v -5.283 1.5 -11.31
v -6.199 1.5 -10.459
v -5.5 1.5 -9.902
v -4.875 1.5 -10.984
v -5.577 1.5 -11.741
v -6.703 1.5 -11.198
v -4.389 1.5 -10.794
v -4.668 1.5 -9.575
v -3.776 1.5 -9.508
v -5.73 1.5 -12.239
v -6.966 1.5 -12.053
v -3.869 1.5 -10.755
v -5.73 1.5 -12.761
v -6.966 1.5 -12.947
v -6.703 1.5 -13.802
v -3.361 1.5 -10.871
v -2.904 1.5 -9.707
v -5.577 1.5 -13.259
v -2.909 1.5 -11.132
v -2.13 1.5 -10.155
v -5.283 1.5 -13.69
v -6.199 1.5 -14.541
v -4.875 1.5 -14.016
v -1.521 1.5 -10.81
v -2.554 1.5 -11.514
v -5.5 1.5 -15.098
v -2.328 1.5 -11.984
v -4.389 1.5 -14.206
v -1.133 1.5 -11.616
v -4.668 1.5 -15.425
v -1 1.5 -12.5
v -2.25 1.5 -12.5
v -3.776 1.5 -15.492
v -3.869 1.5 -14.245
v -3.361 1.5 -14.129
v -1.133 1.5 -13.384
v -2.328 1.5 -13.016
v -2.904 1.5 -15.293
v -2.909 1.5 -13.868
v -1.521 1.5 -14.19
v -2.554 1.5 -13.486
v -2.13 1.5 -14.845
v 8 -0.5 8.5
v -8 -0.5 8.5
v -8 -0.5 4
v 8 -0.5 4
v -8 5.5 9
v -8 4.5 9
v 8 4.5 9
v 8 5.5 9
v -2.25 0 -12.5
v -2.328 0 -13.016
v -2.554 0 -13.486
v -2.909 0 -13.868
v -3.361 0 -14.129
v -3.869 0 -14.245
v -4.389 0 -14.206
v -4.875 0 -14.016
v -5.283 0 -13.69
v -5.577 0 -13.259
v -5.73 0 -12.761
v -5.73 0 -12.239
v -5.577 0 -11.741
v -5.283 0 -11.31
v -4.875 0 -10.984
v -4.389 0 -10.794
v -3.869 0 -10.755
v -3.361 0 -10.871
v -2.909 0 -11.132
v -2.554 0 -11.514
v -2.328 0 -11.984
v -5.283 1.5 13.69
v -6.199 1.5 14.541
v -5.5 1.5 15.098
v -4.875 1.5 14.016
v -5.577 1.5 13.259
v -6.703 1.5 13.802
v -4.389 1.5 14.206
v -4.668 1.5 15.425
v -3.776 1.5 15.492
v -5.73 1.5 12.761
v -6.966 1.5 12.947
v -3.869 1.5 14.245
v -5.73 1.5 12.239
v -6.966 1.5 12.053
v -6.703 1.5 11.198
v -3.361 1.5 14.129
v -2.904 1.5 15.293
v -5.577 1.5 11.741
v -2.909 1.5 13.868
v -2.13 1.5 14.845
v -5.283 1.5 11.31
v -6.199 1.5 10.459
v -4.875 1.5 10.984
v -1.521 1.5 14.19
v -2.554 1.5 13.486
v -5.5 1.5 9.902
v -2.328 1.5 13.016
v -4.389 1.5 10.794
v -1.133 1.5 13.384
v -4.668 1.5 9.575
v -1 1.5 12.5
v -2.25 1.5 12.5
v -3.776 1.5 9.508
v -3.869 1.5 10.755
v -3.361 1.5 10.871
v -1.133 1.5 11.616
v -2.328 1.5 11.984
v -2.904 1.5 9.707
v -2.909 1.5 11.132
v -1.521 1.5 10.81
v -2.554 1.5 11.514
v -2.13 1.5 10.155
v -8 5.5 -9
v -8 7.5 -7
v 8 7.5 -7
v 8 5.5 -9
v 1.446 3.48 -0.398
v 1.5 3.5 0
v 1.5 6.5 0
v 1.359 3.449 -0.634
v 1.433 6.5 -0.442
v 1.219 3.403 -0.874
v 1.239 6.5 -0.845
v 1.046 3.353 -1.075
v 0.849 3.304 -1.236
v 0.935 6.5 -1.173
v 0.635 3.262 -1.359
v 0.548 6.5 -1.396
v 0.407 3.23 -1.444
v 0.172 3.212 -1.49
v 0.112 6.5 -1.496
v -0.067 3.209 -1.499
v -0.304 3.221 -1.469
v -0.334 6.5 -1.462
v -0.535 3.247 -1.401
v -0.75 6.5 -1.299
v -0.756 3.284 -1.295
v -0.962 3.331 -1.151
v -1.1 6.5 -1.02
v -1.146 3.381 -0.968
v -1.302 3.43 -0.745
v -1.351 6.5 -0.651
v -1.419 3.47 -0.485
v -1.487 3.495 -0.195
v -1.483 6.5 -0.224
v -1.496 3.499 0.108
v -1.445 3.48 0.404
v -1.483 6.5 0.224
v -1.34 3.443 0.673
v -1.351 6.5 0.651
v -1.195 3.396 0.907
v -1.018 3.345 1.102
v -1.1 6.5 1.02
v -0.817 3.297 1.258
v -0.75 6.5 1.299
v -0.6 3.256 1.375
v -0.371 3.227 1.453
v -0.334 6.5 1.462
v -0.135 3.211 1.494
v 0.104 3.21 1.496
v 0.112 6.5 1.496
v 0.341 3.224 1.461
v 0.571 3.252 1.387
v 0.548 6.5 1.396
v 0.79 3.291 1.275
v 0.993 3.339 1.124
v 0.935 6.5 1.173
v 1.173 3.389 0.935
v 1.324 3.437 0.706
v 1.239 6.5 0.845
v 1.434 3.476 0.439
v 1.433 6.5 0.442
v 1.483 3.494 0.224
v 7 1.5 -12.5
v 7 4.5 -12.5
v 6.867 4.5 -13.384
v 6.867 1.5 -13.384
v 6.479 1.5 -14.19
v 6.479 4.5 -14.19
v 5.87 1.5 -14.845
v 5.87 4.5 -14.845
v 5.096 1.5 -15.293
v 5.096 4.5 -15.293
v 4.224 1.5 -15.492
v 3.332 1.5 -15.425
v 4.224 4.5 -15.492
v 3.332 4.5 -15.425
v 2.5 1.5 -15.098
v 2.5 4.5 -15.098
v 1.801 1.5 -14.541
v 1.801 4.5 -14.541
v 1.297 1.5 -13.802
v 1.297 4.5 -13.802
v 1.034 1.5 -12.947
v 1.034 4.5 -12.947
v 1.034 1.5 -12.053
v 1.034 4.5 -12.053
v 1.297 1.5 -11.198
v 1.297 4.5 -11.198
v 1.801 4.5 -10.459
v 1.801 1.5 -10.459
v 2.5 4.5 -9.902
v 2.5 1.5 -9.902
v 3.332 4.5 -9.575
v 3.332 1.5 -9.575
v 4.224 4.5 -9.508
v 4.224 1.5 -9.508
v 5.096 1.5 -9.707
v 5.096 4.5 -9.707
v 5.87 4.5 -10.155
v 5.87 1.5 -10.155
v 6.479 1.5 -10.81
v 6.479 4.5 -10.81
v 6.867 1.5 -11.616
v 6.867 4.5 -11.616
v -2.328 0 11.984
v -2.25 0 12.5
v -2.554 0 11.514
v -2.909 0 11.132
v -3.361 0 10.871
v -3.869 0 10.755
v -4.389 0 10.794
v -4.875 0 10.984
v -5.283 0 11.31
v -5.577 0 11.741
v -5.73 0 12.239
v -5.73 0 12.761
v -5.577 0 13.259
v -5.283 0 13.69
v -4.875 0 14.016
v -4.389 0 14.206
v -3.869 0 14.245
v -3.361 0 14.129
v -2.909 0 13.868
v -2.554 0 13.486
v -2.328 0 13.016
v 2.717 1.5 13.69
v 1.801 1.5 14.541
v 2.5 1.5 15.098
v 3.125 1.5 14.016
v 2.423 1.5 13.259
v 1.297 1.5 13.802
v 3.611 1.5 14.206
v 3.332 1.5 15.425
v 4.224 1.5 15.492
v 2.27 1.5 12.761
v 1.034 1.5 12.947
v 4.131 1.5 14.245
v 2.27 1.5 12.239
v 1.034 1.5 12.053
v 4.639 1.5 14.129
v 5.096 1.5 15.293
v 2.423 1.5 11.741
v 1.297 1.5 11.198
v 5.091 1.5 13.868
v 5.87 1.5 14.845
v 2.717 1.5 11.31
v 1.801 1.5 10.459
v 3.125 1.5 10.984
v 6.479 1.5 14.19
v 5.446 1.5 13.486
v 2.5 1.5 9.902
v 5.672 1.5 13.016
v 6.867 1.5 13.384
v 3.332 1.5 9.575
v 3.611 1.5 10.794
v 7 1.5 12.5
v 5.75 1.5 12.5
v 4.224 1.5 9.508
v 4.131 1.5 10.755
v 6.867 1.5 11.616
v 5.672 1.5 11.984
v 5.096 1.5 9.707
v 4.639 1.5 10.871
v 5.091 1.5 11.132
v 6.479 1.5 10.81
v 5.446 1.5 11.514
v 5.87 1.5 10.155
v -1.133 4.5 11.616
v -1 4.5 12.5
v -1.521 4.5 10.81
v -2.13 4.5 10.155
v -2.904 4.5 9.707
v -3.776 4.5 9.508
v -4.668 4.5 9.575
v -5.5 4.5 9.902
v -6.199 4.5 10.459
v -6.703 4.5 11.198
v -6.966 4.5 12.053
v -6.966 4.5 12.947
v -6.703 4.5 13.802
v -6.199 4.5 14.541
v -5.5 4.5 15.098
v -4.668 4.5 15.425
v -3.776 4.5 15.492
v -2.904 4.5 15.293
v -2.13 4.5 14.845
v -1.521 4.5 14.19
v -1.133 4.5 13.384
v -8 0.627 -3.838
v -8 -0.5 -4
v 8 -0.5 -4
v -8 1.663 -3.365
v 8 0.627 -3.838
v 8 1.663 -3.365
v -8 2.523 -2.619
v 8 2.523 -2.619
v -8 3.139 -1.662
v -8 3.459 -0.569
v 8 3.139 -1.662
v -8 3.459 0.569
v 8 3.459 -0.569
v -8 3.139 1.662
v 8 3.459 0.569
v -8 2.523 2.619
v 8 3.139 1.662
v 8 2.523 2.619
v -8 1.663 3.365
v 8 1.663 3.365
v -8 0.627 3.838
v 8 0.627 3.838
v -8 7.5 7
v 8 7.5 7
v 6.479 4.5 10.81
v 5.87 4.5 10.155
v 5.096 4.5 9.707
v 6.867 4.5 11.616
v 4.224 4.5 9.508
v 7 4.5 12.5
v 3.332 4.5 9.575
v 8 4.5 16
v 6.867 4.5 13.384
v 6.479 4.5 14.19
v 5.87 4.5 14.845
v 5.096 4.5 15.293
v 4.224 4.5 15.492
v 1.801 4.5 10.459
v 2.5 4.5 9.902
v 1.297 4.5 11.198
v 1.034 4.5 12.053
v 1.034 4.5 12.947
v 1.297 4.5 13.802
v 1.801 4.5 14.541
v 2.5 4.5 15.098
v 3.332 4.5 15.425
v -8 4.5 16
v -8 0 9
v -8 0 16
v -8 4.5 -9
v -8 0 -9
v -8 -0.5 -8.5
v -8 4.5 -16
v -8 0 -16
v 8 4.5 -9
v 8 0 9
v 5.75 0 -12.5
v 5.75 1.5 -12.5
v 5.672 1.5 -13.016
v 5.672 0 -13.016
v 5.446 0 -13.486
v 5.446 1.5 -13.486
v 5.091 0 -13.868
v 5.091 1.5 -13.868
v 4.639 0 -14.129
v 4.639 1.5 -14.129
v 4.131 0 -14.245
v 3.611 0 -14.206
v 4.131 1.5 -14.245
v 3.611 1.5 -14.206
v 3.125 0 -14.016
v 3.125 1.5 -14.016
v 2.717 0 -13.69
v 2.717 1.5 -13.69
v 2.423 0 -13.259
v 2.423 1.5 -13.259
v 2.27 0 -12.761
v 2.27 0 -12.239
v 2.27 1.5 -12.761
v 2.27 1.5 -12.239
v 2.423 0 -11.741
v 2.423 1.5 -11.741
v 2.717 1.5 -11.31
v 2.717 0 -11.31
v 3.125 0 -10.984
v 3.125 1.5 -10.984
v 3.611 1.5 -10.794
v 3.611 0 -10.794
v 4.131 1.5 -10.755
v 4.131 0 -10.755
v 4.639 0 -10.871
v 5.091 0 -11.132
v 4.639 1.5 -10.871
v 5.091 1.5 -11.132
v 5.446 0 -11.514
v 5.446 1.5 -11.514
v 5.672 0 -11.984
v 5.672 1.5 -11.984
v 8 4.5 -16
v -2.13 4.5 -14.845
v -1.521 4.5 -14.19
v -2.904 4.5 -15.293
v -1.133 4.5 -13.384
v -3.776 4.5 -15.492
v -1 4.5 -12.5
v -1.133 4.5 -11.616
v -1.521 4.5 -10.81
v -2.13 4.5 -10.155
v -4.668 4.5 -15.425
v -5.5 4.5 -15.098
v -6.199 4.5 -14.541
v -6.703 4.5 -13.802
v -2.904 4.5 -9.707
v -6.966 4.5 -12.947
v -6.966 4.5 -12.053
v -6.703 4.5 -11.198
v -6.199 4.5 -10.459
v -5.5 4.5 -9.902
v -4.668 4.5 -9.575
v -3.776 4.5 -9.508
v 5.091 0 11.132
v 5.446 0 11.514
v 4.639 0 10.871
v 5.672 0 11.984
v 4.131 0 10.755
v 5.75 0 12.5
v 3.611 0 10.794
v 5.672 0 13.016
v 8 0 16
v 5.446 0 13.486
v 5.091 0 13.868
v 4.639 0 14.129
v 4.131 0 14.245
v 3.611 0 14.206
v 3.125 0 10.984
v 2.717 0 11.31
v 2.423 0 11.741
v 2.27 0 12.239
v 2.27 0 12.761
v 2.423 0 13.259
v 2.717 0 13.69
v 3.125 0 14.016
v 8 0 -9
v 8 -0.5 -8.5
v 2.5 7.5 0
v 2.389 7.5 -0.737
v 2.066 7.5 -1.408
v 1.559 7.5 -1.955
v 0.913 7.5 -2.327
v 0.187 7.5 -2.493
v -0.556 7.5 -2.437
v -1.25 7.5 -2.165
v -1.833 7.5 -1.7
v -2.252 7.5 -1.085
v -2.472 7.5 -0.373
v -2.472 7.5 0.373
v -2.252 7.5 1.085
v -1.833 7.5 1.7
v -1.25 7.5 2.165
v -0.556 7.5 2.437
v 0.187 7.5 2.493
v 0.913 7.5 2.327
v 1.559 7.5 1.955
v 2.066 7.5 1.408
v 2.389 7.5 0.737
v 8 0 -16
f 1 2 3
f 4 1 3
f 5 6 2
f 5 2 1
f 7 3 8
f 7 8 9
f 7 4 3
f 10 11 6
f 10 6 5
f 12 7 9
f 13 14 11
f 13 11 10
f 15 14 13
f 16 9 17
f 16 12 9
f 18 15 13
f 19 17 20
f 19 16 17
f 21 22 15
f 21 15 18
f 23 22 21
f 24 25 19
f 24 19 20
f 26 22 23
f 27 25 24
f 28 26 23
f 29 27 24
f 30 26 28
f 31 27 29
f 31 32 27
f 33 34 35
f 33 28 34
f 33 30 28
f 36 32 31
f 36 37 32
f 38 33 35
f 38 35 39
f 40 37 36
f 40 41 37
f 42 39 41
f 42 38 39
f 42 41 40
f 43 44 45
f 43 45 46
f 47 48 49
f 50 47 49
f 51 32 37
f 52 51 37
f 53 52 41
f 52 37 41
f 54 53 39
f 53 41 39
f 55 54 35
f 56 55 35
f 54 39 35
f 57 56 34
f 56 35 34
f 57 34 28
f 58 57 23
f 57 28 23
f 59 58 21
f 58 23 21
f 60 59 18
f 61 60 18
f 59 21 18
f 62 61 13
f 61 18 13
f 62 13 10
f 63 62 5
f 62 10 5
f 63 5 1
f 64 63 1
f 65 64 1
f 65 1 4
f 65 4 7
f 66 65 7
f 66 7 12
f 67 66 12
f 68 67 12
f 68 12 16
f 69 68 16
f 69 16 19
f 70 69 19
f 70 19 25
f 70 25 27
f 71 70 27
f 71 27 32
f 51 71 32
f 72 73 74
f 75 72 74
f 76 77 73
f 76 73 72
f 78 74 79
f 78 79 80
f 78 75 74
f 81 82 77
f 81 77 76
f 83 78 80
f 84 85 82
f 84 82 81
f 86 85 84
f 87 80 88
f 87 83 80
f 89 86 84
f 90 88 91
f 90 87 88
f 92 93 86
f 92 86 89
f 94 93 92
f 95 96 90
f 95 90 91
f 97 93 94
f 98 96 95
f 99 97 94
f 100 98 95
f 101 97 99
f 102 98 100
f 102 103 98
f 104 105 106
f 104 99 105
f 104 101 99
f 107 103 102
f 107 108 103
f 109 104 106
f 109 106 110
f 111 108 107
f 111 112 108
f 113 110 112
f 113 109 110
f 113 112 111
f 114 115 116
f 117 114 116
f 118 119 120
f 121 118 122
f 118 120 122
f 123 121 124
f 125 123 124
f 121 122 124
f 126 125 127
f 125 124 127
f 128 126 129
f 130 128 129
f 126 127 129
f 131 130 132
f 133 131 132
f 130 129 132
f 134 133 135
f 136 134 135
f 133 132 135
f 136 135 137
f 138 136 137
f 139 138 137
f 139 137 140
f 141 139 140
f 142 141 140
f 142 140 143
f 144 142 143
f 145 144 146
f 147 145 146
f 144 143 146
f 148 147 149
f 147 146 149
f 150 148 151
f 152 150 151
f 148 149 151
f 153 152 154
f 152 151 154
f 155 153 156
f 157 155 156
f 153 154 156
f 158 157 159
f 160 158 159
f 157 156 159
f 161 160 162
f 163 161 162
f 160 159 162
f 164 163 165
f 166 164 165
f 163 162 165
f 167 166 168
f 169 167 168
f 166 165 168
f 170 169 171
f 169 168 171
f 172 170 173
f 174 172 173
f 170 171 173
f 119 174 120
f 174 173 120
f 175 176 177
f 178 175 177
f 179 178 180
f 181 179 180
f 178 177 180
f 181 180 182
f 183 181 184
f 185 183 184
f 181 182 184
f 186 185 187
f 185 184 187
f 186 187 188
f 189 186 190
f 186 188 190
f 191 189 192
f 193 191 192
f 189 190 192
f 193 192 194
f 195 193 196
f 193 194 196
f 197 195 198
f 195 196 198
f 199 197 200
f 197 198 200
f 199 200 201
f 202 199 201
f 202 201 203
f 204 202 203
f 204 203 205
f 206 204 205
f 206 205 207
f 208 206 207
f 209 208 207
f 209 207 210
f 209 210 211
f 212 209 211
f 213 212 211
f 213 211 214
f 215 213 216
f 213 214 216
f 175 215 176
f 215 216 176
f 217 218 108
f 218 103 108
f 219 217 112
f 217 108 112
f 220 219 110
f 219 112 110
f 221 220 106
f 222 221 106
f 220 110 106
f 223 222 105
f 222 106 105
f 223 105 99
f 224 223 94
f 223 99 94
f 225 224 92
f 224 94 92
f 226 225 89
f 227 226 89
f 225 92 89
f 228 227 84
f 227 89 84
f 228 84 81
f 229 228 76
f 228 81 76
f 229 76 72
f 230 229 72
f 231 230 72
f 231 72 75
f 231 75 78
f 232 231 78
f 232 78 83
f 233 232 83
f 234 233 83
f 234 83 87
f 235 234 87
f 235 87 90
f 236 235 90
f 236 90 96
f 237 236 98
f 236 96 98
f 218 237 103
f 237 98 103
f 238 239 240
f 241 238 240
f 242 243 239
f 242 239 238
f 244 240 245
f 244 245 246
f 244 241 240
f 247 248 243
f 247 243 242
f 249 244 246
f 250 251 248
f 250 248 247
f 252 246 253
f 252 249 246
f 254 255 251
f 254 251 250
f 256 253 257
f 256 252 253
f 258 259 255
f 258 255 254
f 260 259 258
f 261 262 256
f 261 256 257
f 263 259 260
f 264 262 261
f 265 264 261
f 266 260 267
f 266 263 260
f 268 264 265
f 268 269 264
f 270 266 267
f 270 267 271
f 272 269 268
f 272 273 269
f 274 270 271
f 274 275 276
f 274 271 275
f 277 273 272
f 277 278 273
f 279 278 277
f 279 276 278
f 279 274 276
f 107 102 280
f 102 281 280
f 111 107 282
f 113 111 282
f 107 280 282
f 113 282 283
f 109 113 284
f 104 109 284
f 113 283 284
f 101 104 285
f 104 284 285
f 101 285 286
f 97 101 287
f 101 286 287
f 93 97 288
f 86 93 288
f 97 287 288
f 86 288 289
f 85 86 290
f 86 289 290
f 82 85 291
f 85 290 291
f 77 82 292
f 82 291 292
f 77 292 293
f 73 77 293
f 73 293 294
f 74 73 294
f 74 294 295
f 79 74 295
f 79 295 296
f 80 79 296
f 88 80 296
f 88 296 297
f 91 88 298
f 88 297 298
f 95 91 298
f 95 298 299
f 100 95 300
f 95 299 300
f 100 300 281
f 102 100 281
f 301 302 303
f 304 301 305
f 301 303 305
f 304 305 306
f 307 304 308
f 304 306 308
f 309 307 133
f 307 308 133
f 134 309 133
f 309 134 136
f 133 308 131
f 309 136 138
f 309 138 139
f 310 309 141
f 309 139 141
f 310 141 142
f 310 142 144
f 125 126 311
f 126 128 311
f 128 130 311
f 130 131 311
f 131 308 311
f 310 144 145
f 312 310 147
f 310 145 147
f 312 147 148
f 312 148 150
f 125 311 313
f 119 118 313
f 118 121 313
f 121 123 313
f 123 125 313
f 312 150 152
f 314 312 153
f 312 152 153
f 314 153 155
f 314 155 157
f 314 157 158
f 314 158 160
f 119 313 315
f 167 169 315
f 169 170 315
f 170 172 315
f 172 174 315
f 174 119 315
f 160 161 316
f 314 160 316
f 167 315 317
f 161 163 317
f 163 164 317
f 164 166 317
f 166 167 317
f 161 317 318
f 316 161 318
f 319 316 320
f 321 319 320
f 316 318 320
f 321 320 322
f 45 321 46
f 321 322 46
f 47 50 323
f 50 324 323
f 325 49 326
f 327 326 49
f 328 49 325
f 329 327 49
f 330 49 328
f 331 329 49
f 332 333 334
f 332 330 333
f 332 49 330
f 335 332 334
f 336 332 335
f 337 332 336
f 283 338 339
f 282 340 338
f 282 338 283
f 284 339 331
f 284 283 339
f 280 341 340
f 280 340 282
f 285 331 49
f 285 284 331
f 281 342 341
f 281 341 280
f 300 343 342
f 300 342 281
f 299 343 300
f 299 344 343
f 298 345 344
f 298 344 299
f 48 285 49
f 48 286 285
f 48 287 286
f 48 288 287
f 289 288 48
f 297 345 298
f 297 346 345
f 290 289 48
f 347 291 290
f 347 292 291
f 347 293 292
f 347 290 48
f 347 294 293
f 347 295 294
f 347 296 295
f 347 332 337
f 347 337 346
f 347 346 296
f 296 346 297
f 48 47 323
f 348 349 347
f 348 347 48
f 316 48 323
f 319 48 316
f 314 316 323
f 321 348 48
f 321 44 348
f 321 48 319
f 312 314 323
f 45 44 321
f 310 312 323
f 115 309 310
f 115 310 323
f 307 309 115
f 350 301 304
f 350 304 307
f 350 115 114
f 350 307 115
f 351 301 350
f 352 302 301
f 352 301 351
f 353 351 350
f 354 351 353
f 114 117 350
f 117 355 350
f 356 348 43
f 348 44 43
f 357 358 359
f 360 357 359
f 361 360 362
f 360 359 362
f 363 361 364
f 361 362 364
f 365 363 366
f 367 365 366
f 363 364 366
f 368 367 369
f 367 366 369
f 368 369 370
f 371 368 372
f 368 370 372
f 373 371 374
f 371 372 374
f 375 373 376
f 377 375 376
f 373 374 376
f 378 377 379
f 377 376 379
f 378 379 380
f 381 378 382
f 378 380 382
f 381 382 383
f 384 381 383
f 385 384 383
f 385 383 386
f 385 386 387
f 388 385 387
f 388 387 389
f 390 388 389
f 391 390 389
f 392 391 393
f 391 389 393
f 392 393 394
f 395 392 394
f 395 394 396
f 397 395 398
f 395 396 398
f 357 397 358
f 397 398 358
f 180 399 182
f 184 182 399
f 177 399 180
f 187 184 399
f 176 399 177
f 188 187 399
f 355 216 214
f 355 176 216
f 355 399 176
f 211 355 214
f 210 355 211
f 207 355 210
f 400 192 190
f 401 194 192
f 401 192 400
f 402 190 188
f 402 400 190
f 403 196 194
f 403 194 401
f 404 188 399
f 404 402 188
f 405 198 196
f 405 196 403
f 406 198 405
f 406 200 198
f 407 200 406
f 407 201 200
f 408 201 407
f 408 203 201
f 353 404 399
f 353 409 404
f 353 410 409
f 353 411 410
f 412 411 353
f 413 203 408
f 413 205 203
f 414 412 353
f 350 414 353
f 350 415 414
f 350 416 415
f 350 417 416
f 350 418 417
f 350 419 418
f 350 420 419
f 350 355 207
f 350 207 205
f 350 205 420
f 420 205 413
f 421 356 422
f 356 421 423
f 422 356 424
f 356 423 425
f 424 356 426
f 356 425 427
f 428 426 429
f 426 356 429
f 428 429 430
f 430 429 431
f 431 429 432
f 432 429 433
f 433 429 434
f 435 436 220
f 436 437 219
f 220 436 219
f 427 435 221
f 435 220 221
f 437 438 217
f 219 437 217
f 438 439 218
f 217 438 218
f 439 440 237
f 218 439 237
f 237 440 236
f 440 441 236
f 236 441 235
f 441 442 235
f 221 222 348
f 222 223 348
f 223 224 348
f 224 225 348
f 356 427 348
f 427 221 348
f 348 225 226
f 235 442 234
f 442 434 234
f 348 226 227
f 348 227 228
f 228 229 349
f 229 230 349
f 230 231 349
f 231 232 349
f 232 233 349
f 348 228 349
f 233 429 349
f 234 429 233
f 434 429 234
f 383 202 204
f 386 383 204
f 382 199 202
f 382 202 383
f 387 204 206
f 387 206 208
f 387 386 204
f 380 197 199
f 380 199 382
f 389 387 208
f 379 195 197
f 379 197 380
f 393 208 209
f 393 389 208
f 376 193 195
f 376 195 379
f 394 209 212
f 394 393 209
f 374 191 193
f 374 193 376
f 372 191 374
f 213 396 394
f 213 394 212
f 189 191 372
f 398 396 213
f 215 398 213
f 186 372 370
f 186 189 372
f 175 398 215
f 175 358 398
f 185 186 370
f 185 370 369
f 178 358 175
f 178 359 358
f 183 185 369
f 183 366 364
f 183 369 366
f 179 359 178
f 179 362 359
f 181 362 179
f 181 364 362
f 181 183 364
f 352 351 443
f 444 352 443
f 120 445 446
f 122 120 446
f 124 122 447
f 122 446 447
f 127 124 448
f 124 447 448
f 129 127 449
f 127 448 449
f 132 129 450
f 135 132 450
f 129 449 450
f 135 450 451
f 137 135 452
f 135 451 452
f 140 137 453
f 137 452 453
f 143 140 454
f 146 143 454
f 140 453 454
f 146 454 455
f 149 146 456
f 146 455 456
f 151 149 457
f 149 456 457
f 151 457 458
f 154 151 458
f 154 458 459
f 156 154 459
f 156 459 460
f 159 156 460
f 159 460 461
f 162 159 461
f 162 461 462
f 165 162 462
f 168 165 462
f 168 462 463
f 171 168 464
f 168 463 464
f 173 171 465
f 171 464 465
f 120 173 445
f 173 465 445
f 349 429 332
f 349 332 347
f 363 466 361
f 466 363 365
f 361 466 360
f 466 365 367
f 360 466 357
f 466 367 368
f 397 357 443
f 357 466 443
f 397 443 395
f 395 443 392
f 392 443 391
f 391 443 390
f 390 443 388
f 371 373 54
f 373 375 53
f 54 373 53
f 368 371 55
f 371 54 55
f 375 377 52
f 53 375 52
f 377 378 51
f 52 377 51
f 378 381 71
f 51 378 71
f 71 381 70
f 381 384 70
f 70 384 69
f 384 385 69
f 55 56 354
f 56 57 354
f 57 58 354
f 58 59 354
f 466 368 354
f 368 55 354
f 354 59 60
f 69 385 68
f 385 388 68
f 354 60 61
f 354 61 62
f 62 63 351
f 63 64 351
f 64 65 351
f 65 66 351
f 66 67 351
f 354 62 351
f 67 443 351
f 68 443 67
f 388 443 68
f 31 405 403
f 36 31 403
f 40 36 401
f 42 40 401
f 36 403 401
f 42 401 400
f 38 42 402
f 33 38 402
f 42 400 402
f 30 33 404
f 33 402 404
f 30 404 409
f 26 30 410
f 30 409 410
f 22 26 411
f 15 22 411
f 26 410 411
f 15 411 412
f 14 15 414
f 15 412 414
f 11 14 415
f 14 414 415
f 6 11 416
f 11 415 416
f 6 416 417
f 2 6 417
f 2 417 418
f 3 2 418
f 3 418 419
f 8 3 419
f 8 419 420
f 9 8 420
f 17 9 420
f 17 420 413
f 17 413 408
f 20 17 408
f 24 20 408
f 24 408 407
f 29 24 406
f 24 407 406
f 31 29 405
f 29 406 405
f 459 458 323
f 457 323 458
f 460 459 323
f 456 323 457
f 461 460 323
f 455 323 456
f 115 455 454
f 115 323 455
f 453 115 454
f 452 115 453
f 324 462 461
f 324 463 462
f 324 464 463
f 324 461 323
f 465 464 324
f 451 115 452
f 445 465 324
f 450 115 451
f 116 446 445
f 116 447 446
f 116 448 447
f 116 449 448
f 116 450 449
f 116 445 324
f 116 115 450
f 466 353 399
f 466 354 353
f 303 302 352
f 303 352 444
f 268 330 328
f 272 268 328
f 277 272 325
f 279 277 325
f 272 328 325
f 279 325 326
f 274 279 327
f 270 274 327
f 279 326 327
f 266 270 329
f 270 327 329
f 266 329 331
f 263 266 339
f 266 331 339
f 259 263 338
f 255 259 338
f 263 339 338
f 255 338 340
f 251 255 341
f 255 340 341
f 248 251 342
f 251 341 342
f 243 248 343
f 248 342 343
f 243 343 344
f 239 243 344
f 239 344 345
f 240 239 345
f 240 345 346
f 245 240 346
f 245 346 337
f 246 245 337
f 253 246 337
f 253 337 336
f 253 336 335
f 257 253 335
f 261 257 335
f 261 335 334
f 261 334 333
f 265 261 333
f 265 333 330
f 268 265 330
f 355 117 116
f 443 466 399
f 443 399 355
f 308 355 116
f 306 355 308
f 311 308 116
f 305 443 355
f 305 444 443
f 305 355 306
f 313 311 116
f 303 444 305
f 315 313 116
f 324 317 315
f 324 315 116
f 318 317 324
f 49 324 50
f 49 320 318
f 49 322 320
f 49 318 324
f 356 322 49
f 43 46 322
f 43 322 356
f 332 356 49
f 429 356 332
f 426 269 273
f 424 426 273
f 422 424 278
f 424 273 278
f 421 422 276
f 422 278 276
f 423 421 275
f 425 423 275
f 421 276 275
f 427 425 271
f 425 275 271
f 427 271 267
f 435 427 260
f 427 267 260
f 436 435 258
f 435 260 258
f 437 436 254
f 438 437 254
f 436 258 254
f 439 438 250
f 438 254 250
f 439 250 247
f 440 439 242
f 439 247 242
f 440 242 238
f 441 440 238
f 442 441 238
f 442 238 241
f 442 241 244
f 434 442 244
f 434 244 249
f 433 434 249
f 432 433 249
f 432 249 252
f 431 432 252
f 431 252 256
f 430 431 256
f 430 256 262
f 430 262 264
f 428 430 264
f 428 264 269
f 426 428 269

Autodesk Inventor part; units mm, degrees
ref_plane "YZ Plane" through (0, 0, 0) normal (1, 0, 0) x (0, 1, 0)
ref_plane "XZ Plane" through (0, 0, 0) normal (0, 1, 0) x (-1, 0, 0)
ref_plane "XY Plane" through (0, 0, 0) normal (0, 0, 1) x (1, 0, 0)
sketch "Sketch3" plane through (0, 0, 0) normal (0, 1, 0) x (-1, 0, 0)
  line L0 (-8, 16) -> (8, 16)
  line L1 (8, 16) -> (8, -16)
  line L2 (8, -16) -> (-8, -16)
  line L3 (-8, -16) -> (-8, 16)
  line L4 (-8, 16) -> (8, -16) construction
  line L5 (8, 16) -> (-8, -16) construction
  point P0 (0, 0)
  dimension "d7" = 16
  dimension "d8" = 32
extrude "Extrusion1" add sketch "Sketch3" along normal blind 4.5
sketch "Sketch4" plane through (0, 0, 0) normal (0, -1, 0) x (1, 0, 0)
  line L0 (0, 0) -> (0, 9)
  line L1 (0, 9) -> (0, -9)
  line L2 (8, 16) -> (8, -16) projected
  line L3 (-8, -9) -> (8, -9)
  line L4 (8, -9) -> (8, 9)
  line L5 (8, 9) -> (-8, 9)
  line L6 (-8, 9) -> (-8, -9)
  line L7 (-8, -9) -> (8, 9) construction
  line L8 (8, -9) -> (-8, 9) construction
  dimension "d11" = 9
  dimension "d12" = 18
  dimension "d13" = 41.633
extrude "Extrusion2" add sketch "Sketch4" along normal blind 0.5
chamfer "Chamfer1" distance 0.5 angle 45 1 edges at (0, -0.5, 9)
chamfer "Chamfer2" distance 0.5 angle 45 1 edges at (0, -0.5, -9)
sketch "Sketch5" plane through (0, 4.5, 0) normal (0, 1, 0) x (1, 0, 0)
  line L0 (8, -16) -> (8, 16) projected
  line L1 (-8, -9) -> (8, -9)
  line L2 (8, -9) -> (8, 9)
  line L3 (8, 9) -> (-8, 9)
  line L4 (-8, 9) -> (-8, -9)
  line L5 (-8, -9) -> (8, 9) construction
  line L6 (8, -9) -> (-8, 9) construction
  point P0 (0, 0)
  dimension "d22" = 18
extrude "Extrusion3" add sketch "Sketch5" along normal blind 3
chamfer "Chamfer3" distance 2 angle 45 2 edges at (0, 7.5, 9) (0, 7.5, -9)
sketch "Sketch6" plane through (0, 4.5, 0) normal (0, 1, 0) x (1, 0, 0)
  line L0 (-8, -9) -> (-8, -16) construction
  line L1 (-8, -12.5) -> (8, -12.5) construction
  line L2 (8, -9) -> (8, -16) construction
  circle A0 centre (4, -12.5) radius 3 construction
  line L3 (8, -16) -> (-8, -16) construction
  line L4 (0, -16) -> (0, 17.9963) construction
  circle A1 centre (-4, -12.5) radius 3 construction
  line L5 (-8, -8.5) -> (-8, 8.5) construction
  line L6 (-8, 0) -> (8, 0) construction
  line L7 (8, 8.5) -> (8, -8.5) construction
  circle A2 centre (4, 12.5) radius 3 construction
  circle A3 centre (-4, 12.5) radius 3 construction
  circle A4 centre (4, -12.5) radius 3
  circle A5 centre (-4, -12.5) radius 3 construction
  circle A6 centre (-4, -12.5) radius 3
  circle A7 centre (4, 12.5) radius 3 construction
  circle A8 centre (-4, 12.5) radius 3 construction
  circle A9 centre (4, 12.5) radius 3
  circle A10 centre (-4, 12.5) radius 3 construction
  circle A11 centre (-4, 12.5) radius 3
  point P0 (0, 0)
  dimension "d28" = 6
  dimension "d29" = 4
  dimension "d30" = 33.9963
extrude "Extrusion4" cut sketch "Sketch6" against normal blind 3
sketch "Sketch7" plane through (0, 4.5, 0) normal (0, 1, 0) x (1, 0, 0)
  circle A0 centre (-4, -12.5) radius 3 construction
  line L0 (-7, -12.5) -> (-4, -12.5) construction
  circle A1 centre (4, -12.5) radius 3 construction
  line L1 (-4, -12.5) -> (4, -12.5) construction
  circle A2 centre (4, 12.5) radius 3 construction
  line L2 (4, -12.5) -> (4, 12.5) construction
  circle A3 centre (-4, 12.5) radius 3 construction
  line L3 (4, 12.5) -> (-4, 12.5) construction
  circle A4 centre (-4, -12.5) radius 1.75
  circle A5 centre (4, -12.5) radius 1.75
  circle A6 centre (4, 12.5) radius 1.75
  circle A7 centre (-4, 12.5) radius 1.75
  point P0 (0, 0)
  dimension "d33" = 3.5
  dimension "d34" = 3.5
  dimension "d35" = 3.5
  dimension "d36" = 3.5
extrude "Extrusion5" cut sketch "Sketch7" against normal blind 5
sketch "Sketch8" plane through (0, 7.5, 0) normal (0, 1, 0) x (1, 0, 0)
  circle A0 centre (0, 0) radius 1.5
  dimension "d39" = 3
extrude "Extrusion6" cut sketch "Sketch8" against normal blind 99
chamfer "Chamfer4" distance 1 angle 45 1 edges at (-1.5, 7.5, 0)
sketch "Sketch9" plane through (8, 0, 16) normal (1, 0, 0) x (0, 0, -1)
  line L0 (17.5, -0.5) -> (14.5, -0.5) projected
  circle A0 centre (16, -0.5) radius 4
  point P0 (16, 0)
  dimension "d45" = 8
extrude "Extrusion7" cut sketch "Sketch9" against normal blind 99
properties part number "Upper Base Bearing Holder" material "Brass, Soft Yellow"
